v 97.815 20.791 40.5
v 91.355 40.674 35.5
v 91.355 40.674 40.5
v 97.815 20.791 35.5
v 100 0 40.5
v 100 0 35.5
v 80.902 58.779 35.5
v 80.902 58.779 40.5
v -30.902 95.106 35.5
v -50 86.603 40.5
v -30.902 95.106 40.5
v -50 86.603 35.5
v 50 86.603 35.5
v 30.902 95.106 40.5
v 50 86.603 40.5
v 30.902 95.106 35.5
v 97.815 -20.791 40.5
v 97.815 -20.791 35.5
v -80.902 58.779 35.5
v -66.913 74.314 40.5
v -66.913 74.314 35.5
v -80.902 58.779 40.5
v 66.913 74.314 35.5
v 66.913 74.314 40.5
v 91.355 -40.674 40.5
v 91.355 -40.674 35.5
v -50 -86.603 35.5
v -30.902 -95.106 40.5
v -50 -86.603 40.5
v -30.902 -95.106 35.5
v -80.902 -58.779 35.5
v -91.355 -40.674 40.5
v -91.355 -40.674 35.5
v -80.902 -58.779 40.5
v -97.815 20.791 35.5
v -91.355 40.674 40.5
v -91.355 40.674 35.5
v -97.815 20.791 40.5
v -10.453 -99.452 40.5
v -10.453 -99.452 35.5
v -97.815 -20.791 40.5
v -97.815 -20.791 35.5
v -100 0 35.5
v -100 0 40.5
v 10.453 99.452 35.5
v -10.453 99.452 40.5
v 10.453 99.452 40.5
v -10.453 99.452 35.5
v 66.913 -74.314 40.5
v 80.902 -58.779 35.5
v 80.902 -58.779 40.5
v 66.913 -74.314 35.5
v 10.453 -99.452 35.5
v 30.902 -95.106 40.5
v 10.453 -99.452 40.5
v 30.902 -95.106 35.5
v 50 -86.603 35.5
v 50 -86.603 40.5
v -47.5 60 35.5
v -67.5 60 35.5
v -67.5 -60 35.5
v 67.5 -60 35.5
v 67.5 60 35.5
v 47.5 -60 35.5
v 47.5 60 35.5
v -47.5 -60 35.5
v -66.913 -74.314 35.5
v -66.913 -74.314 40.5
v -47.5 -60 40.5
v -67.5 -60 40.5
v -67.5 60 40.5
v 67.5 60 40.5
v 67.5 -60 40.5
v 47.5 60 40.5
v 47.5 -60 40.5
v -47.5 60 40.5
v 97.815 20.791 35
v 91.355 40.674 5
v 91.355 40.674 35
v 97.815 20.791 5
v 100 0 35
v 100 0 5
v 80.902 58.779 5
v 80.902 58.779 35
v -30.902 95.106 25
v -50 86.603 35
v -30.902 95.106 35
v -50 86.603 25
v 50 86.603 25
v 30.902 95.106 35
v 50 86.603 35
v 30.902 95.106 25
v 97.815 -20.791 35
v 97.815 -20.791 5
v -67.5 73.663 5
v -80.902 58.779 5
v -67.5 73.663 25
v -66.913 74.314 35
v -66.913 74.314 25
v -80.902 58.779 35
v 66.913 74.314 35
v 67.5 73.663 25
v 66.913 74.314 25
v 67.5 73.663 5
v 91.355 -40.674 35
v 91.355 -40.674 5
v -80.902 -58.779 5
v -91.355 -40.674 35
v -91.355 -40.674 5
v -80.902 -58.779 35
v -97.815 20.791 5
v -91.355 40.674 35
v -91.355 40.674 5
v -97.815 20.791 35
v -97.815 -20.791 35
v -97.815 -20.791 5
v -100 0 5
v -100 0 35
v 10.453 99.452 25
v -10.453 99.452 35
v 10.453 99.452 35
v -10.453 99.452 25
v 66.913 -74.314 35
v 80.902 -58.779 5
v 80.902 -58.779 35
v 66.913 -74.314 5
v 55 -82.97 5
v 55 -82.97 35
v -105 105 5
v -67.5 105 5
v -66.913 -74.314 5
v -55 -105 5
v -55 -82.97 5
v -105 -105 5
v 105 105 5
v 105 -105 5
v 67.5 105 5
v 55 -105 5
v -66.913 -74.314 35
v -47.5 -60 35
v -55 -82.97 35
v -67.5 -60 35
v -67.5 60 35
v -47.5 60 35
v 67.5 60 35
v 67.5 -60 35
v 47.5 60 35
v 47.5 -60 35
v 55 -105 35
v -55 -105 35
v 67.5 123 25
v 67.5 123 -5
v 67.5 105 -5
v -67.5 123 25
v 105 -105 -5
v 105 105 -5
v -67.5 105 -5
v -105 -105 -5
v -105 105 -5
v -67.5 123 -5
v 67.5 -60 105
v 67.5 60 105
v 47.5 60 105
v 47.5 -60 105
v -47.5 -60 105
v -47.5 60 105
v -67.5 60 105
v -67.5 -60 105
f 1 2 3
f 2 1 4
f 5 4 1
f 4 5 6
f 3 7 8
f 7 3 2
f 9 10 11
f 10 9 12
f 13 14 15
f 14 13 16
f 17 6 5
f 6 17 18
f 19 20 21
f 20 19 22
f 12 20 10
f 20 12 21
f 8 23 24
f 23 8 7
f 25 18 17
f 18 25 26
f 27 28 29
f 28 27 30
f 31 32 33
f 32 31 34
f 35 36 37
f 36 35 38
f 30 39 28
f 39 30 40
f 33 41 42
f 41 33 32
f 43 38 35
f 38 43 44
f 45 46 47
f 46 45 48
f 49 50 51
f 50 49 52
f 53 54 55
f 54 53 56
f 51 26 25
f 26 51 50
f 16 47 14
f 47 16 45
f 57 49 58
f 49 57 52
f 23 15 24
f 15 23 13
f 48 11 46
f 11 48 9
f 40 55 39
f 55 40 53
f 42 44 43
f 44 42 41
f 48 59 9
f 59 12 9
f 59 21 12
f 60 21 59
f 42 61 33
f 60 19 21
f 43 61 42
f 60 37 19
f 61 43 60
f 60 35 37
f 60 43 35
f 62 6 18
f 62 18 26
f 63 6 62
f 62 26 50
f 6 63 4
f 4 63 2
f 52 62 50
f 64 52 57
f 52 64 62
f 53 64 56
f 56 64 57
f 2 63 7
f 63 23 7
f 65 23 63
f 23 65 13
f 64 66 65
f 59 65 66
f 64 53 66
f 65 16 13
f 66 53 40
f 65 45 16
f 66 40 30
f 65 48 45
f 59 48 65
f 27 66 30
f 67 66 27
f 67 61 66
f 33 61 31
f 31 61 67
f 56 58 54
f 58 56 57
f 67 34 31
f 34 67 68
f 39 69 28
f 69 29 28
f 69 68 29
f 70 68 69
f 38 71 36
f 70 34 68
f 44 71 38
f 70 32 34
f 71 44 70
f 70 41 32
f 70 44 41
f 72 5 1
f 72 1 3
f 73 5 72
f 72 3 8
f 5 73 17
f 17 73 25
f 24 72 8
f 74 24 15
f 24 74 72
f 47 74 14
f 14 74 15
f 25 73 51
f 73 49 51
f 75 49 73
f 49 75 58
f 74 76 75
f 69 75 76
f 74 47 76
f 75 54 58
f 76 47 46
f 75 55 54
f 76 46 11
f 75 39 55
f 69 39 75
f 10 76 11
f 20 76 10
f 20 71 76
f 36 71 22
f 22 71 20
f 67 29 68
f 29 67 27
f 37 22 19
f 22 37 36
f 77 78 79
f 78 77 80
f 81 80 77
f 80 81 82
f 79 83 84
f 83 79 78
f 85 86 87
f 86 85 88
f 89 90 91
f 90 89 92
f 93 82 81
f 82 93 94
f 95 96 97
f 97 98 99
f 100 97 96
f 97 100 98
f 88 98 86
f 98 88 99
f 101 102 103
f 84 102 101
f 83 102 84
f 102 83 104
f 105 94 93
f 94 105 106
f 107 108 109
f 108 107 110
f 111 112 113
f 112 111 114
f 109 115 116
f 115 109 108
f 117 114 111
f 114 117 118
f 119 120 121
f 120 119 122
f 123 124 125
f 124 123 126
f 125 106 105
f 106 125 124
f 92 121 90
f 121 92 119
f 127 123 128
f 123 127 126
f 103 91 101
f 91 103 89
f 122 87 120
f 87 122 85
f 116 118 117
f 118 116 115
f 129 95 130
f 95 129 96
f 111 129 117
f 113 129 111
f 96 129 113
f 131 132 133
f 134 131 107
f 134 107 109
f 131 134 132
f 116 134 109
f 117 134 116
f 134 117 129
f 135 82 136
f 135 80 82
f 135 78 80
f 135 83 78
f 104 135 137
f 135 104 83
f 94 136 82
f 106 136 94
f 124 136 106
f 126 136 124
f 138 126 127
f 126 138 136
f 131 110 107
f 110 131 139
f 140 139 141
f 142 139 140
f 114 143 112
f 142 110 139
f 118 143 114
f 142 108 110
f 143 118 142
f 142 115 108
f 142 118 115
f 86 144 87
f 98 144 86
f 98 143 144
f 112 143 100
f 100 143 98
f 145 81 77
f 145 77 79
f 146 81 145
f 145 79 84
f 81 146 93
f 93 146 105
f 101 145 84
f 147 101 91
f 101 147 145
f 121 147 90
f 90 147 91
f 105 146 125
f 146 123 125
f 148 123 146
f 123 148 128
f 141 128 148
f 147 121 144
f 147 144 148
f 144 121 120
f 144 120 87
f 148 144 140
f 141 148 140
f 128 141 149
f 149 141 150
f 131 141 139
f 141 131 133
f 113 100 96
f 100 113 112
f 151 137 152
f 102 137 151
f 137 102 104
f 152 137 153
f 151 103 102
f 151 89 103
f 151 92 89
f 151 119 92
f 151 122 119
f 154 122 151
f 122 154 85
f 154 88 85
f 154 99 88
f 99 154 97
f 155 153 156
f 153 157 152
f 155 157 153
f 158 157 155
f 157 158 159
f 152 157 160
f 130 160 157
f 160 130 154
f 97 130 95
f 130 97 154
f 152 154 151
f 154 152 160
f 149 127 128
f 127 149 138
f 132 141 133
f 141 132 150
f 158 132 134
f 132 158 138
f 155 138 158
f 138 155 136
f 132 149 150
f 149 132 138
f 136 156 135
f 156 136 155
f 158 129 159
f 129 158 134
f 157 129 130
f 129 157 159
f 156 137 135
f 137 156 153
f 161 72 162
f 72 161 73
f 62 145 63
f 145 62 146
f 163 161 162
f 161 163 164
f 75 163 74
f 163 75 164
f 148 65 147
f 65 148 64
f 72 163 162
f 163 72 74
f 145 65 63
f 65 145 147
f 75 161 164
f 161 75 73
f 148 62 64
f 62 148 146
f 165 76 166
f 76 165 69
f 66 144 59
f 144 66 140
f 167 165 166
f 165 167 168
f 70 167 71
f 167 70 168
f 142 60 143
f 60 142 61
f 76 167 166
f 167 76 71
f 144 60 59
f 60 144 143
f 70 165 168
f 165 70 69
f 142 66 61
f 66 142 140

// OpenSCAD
mount_base_length=210;
mount_base_width=210;
mount_base_thickness=10;
mount_base_cylinder_diameter=200;
mount_base_cylinder_thickness=30;
mount_base_cylinder_length=135;
mount_base_column_thickness=20;
mount_base_column_width=120;
mount_base_column_height=80;

/////////////////////模块-赤道仪基座/////////////////////////////
cem120_mount_base();
module cem120_mount_base(){
//    color("silver")
cube([mount_base_length,mount_base_width,mount_base_thickness],center=true);


translate([0,0,mount_base_cylinder_thickness/2+mount_base_thickness/2]){
       //    color("silver")
    union(){
        
 
        translate([0,0,mount_base_cylinder_thickness/2+3])
            //基座大圆环商品的圆柱0.5里面
        cylinder(h=5,d=mount_base_cylinder_diameter,center=true);

    //基座大圆环
 
    cylinder(h=mount_base_cylinder_thickness,d=mount_base_cylinder_diameter,center=true);
        
        //后面的插座
    translate([0,(mount_base_length/2-mount_base_cylinder_length/2-2+2*mount_base_thickness),-mount_base_thickness])
        cube([mount_base_cylinder_length,mount_base_cylinder_length,mount_base_cylinder_thickness],center=true);
        //前面的突出部
        translate([0,-mount_base_cylinder_diameter/2/2,0])
        cube([110,110,mount_base_cylinder_thickness],center=true);
        
        
        
        }
        
    }

//立柱
translate([mount_base_cylinder_length/2-mount_base_column_thickness,-mount_base_column_width/2,mount_base_cylinder_thickness-mount_base_thickness/2])
    color("grey")
cube([mount_base_column_thickness,mount_base_column_width,mount_base_column_height]);
    
translate([-mount_base_cylinder_length/2,-mount_base_column_width/2,mount_base_cylinder_thickness-mount_base_thickness/2])
    color("grey")
cube([mount_base_column_thickness,mount_base_column_width,mount_base_column_height]);}
